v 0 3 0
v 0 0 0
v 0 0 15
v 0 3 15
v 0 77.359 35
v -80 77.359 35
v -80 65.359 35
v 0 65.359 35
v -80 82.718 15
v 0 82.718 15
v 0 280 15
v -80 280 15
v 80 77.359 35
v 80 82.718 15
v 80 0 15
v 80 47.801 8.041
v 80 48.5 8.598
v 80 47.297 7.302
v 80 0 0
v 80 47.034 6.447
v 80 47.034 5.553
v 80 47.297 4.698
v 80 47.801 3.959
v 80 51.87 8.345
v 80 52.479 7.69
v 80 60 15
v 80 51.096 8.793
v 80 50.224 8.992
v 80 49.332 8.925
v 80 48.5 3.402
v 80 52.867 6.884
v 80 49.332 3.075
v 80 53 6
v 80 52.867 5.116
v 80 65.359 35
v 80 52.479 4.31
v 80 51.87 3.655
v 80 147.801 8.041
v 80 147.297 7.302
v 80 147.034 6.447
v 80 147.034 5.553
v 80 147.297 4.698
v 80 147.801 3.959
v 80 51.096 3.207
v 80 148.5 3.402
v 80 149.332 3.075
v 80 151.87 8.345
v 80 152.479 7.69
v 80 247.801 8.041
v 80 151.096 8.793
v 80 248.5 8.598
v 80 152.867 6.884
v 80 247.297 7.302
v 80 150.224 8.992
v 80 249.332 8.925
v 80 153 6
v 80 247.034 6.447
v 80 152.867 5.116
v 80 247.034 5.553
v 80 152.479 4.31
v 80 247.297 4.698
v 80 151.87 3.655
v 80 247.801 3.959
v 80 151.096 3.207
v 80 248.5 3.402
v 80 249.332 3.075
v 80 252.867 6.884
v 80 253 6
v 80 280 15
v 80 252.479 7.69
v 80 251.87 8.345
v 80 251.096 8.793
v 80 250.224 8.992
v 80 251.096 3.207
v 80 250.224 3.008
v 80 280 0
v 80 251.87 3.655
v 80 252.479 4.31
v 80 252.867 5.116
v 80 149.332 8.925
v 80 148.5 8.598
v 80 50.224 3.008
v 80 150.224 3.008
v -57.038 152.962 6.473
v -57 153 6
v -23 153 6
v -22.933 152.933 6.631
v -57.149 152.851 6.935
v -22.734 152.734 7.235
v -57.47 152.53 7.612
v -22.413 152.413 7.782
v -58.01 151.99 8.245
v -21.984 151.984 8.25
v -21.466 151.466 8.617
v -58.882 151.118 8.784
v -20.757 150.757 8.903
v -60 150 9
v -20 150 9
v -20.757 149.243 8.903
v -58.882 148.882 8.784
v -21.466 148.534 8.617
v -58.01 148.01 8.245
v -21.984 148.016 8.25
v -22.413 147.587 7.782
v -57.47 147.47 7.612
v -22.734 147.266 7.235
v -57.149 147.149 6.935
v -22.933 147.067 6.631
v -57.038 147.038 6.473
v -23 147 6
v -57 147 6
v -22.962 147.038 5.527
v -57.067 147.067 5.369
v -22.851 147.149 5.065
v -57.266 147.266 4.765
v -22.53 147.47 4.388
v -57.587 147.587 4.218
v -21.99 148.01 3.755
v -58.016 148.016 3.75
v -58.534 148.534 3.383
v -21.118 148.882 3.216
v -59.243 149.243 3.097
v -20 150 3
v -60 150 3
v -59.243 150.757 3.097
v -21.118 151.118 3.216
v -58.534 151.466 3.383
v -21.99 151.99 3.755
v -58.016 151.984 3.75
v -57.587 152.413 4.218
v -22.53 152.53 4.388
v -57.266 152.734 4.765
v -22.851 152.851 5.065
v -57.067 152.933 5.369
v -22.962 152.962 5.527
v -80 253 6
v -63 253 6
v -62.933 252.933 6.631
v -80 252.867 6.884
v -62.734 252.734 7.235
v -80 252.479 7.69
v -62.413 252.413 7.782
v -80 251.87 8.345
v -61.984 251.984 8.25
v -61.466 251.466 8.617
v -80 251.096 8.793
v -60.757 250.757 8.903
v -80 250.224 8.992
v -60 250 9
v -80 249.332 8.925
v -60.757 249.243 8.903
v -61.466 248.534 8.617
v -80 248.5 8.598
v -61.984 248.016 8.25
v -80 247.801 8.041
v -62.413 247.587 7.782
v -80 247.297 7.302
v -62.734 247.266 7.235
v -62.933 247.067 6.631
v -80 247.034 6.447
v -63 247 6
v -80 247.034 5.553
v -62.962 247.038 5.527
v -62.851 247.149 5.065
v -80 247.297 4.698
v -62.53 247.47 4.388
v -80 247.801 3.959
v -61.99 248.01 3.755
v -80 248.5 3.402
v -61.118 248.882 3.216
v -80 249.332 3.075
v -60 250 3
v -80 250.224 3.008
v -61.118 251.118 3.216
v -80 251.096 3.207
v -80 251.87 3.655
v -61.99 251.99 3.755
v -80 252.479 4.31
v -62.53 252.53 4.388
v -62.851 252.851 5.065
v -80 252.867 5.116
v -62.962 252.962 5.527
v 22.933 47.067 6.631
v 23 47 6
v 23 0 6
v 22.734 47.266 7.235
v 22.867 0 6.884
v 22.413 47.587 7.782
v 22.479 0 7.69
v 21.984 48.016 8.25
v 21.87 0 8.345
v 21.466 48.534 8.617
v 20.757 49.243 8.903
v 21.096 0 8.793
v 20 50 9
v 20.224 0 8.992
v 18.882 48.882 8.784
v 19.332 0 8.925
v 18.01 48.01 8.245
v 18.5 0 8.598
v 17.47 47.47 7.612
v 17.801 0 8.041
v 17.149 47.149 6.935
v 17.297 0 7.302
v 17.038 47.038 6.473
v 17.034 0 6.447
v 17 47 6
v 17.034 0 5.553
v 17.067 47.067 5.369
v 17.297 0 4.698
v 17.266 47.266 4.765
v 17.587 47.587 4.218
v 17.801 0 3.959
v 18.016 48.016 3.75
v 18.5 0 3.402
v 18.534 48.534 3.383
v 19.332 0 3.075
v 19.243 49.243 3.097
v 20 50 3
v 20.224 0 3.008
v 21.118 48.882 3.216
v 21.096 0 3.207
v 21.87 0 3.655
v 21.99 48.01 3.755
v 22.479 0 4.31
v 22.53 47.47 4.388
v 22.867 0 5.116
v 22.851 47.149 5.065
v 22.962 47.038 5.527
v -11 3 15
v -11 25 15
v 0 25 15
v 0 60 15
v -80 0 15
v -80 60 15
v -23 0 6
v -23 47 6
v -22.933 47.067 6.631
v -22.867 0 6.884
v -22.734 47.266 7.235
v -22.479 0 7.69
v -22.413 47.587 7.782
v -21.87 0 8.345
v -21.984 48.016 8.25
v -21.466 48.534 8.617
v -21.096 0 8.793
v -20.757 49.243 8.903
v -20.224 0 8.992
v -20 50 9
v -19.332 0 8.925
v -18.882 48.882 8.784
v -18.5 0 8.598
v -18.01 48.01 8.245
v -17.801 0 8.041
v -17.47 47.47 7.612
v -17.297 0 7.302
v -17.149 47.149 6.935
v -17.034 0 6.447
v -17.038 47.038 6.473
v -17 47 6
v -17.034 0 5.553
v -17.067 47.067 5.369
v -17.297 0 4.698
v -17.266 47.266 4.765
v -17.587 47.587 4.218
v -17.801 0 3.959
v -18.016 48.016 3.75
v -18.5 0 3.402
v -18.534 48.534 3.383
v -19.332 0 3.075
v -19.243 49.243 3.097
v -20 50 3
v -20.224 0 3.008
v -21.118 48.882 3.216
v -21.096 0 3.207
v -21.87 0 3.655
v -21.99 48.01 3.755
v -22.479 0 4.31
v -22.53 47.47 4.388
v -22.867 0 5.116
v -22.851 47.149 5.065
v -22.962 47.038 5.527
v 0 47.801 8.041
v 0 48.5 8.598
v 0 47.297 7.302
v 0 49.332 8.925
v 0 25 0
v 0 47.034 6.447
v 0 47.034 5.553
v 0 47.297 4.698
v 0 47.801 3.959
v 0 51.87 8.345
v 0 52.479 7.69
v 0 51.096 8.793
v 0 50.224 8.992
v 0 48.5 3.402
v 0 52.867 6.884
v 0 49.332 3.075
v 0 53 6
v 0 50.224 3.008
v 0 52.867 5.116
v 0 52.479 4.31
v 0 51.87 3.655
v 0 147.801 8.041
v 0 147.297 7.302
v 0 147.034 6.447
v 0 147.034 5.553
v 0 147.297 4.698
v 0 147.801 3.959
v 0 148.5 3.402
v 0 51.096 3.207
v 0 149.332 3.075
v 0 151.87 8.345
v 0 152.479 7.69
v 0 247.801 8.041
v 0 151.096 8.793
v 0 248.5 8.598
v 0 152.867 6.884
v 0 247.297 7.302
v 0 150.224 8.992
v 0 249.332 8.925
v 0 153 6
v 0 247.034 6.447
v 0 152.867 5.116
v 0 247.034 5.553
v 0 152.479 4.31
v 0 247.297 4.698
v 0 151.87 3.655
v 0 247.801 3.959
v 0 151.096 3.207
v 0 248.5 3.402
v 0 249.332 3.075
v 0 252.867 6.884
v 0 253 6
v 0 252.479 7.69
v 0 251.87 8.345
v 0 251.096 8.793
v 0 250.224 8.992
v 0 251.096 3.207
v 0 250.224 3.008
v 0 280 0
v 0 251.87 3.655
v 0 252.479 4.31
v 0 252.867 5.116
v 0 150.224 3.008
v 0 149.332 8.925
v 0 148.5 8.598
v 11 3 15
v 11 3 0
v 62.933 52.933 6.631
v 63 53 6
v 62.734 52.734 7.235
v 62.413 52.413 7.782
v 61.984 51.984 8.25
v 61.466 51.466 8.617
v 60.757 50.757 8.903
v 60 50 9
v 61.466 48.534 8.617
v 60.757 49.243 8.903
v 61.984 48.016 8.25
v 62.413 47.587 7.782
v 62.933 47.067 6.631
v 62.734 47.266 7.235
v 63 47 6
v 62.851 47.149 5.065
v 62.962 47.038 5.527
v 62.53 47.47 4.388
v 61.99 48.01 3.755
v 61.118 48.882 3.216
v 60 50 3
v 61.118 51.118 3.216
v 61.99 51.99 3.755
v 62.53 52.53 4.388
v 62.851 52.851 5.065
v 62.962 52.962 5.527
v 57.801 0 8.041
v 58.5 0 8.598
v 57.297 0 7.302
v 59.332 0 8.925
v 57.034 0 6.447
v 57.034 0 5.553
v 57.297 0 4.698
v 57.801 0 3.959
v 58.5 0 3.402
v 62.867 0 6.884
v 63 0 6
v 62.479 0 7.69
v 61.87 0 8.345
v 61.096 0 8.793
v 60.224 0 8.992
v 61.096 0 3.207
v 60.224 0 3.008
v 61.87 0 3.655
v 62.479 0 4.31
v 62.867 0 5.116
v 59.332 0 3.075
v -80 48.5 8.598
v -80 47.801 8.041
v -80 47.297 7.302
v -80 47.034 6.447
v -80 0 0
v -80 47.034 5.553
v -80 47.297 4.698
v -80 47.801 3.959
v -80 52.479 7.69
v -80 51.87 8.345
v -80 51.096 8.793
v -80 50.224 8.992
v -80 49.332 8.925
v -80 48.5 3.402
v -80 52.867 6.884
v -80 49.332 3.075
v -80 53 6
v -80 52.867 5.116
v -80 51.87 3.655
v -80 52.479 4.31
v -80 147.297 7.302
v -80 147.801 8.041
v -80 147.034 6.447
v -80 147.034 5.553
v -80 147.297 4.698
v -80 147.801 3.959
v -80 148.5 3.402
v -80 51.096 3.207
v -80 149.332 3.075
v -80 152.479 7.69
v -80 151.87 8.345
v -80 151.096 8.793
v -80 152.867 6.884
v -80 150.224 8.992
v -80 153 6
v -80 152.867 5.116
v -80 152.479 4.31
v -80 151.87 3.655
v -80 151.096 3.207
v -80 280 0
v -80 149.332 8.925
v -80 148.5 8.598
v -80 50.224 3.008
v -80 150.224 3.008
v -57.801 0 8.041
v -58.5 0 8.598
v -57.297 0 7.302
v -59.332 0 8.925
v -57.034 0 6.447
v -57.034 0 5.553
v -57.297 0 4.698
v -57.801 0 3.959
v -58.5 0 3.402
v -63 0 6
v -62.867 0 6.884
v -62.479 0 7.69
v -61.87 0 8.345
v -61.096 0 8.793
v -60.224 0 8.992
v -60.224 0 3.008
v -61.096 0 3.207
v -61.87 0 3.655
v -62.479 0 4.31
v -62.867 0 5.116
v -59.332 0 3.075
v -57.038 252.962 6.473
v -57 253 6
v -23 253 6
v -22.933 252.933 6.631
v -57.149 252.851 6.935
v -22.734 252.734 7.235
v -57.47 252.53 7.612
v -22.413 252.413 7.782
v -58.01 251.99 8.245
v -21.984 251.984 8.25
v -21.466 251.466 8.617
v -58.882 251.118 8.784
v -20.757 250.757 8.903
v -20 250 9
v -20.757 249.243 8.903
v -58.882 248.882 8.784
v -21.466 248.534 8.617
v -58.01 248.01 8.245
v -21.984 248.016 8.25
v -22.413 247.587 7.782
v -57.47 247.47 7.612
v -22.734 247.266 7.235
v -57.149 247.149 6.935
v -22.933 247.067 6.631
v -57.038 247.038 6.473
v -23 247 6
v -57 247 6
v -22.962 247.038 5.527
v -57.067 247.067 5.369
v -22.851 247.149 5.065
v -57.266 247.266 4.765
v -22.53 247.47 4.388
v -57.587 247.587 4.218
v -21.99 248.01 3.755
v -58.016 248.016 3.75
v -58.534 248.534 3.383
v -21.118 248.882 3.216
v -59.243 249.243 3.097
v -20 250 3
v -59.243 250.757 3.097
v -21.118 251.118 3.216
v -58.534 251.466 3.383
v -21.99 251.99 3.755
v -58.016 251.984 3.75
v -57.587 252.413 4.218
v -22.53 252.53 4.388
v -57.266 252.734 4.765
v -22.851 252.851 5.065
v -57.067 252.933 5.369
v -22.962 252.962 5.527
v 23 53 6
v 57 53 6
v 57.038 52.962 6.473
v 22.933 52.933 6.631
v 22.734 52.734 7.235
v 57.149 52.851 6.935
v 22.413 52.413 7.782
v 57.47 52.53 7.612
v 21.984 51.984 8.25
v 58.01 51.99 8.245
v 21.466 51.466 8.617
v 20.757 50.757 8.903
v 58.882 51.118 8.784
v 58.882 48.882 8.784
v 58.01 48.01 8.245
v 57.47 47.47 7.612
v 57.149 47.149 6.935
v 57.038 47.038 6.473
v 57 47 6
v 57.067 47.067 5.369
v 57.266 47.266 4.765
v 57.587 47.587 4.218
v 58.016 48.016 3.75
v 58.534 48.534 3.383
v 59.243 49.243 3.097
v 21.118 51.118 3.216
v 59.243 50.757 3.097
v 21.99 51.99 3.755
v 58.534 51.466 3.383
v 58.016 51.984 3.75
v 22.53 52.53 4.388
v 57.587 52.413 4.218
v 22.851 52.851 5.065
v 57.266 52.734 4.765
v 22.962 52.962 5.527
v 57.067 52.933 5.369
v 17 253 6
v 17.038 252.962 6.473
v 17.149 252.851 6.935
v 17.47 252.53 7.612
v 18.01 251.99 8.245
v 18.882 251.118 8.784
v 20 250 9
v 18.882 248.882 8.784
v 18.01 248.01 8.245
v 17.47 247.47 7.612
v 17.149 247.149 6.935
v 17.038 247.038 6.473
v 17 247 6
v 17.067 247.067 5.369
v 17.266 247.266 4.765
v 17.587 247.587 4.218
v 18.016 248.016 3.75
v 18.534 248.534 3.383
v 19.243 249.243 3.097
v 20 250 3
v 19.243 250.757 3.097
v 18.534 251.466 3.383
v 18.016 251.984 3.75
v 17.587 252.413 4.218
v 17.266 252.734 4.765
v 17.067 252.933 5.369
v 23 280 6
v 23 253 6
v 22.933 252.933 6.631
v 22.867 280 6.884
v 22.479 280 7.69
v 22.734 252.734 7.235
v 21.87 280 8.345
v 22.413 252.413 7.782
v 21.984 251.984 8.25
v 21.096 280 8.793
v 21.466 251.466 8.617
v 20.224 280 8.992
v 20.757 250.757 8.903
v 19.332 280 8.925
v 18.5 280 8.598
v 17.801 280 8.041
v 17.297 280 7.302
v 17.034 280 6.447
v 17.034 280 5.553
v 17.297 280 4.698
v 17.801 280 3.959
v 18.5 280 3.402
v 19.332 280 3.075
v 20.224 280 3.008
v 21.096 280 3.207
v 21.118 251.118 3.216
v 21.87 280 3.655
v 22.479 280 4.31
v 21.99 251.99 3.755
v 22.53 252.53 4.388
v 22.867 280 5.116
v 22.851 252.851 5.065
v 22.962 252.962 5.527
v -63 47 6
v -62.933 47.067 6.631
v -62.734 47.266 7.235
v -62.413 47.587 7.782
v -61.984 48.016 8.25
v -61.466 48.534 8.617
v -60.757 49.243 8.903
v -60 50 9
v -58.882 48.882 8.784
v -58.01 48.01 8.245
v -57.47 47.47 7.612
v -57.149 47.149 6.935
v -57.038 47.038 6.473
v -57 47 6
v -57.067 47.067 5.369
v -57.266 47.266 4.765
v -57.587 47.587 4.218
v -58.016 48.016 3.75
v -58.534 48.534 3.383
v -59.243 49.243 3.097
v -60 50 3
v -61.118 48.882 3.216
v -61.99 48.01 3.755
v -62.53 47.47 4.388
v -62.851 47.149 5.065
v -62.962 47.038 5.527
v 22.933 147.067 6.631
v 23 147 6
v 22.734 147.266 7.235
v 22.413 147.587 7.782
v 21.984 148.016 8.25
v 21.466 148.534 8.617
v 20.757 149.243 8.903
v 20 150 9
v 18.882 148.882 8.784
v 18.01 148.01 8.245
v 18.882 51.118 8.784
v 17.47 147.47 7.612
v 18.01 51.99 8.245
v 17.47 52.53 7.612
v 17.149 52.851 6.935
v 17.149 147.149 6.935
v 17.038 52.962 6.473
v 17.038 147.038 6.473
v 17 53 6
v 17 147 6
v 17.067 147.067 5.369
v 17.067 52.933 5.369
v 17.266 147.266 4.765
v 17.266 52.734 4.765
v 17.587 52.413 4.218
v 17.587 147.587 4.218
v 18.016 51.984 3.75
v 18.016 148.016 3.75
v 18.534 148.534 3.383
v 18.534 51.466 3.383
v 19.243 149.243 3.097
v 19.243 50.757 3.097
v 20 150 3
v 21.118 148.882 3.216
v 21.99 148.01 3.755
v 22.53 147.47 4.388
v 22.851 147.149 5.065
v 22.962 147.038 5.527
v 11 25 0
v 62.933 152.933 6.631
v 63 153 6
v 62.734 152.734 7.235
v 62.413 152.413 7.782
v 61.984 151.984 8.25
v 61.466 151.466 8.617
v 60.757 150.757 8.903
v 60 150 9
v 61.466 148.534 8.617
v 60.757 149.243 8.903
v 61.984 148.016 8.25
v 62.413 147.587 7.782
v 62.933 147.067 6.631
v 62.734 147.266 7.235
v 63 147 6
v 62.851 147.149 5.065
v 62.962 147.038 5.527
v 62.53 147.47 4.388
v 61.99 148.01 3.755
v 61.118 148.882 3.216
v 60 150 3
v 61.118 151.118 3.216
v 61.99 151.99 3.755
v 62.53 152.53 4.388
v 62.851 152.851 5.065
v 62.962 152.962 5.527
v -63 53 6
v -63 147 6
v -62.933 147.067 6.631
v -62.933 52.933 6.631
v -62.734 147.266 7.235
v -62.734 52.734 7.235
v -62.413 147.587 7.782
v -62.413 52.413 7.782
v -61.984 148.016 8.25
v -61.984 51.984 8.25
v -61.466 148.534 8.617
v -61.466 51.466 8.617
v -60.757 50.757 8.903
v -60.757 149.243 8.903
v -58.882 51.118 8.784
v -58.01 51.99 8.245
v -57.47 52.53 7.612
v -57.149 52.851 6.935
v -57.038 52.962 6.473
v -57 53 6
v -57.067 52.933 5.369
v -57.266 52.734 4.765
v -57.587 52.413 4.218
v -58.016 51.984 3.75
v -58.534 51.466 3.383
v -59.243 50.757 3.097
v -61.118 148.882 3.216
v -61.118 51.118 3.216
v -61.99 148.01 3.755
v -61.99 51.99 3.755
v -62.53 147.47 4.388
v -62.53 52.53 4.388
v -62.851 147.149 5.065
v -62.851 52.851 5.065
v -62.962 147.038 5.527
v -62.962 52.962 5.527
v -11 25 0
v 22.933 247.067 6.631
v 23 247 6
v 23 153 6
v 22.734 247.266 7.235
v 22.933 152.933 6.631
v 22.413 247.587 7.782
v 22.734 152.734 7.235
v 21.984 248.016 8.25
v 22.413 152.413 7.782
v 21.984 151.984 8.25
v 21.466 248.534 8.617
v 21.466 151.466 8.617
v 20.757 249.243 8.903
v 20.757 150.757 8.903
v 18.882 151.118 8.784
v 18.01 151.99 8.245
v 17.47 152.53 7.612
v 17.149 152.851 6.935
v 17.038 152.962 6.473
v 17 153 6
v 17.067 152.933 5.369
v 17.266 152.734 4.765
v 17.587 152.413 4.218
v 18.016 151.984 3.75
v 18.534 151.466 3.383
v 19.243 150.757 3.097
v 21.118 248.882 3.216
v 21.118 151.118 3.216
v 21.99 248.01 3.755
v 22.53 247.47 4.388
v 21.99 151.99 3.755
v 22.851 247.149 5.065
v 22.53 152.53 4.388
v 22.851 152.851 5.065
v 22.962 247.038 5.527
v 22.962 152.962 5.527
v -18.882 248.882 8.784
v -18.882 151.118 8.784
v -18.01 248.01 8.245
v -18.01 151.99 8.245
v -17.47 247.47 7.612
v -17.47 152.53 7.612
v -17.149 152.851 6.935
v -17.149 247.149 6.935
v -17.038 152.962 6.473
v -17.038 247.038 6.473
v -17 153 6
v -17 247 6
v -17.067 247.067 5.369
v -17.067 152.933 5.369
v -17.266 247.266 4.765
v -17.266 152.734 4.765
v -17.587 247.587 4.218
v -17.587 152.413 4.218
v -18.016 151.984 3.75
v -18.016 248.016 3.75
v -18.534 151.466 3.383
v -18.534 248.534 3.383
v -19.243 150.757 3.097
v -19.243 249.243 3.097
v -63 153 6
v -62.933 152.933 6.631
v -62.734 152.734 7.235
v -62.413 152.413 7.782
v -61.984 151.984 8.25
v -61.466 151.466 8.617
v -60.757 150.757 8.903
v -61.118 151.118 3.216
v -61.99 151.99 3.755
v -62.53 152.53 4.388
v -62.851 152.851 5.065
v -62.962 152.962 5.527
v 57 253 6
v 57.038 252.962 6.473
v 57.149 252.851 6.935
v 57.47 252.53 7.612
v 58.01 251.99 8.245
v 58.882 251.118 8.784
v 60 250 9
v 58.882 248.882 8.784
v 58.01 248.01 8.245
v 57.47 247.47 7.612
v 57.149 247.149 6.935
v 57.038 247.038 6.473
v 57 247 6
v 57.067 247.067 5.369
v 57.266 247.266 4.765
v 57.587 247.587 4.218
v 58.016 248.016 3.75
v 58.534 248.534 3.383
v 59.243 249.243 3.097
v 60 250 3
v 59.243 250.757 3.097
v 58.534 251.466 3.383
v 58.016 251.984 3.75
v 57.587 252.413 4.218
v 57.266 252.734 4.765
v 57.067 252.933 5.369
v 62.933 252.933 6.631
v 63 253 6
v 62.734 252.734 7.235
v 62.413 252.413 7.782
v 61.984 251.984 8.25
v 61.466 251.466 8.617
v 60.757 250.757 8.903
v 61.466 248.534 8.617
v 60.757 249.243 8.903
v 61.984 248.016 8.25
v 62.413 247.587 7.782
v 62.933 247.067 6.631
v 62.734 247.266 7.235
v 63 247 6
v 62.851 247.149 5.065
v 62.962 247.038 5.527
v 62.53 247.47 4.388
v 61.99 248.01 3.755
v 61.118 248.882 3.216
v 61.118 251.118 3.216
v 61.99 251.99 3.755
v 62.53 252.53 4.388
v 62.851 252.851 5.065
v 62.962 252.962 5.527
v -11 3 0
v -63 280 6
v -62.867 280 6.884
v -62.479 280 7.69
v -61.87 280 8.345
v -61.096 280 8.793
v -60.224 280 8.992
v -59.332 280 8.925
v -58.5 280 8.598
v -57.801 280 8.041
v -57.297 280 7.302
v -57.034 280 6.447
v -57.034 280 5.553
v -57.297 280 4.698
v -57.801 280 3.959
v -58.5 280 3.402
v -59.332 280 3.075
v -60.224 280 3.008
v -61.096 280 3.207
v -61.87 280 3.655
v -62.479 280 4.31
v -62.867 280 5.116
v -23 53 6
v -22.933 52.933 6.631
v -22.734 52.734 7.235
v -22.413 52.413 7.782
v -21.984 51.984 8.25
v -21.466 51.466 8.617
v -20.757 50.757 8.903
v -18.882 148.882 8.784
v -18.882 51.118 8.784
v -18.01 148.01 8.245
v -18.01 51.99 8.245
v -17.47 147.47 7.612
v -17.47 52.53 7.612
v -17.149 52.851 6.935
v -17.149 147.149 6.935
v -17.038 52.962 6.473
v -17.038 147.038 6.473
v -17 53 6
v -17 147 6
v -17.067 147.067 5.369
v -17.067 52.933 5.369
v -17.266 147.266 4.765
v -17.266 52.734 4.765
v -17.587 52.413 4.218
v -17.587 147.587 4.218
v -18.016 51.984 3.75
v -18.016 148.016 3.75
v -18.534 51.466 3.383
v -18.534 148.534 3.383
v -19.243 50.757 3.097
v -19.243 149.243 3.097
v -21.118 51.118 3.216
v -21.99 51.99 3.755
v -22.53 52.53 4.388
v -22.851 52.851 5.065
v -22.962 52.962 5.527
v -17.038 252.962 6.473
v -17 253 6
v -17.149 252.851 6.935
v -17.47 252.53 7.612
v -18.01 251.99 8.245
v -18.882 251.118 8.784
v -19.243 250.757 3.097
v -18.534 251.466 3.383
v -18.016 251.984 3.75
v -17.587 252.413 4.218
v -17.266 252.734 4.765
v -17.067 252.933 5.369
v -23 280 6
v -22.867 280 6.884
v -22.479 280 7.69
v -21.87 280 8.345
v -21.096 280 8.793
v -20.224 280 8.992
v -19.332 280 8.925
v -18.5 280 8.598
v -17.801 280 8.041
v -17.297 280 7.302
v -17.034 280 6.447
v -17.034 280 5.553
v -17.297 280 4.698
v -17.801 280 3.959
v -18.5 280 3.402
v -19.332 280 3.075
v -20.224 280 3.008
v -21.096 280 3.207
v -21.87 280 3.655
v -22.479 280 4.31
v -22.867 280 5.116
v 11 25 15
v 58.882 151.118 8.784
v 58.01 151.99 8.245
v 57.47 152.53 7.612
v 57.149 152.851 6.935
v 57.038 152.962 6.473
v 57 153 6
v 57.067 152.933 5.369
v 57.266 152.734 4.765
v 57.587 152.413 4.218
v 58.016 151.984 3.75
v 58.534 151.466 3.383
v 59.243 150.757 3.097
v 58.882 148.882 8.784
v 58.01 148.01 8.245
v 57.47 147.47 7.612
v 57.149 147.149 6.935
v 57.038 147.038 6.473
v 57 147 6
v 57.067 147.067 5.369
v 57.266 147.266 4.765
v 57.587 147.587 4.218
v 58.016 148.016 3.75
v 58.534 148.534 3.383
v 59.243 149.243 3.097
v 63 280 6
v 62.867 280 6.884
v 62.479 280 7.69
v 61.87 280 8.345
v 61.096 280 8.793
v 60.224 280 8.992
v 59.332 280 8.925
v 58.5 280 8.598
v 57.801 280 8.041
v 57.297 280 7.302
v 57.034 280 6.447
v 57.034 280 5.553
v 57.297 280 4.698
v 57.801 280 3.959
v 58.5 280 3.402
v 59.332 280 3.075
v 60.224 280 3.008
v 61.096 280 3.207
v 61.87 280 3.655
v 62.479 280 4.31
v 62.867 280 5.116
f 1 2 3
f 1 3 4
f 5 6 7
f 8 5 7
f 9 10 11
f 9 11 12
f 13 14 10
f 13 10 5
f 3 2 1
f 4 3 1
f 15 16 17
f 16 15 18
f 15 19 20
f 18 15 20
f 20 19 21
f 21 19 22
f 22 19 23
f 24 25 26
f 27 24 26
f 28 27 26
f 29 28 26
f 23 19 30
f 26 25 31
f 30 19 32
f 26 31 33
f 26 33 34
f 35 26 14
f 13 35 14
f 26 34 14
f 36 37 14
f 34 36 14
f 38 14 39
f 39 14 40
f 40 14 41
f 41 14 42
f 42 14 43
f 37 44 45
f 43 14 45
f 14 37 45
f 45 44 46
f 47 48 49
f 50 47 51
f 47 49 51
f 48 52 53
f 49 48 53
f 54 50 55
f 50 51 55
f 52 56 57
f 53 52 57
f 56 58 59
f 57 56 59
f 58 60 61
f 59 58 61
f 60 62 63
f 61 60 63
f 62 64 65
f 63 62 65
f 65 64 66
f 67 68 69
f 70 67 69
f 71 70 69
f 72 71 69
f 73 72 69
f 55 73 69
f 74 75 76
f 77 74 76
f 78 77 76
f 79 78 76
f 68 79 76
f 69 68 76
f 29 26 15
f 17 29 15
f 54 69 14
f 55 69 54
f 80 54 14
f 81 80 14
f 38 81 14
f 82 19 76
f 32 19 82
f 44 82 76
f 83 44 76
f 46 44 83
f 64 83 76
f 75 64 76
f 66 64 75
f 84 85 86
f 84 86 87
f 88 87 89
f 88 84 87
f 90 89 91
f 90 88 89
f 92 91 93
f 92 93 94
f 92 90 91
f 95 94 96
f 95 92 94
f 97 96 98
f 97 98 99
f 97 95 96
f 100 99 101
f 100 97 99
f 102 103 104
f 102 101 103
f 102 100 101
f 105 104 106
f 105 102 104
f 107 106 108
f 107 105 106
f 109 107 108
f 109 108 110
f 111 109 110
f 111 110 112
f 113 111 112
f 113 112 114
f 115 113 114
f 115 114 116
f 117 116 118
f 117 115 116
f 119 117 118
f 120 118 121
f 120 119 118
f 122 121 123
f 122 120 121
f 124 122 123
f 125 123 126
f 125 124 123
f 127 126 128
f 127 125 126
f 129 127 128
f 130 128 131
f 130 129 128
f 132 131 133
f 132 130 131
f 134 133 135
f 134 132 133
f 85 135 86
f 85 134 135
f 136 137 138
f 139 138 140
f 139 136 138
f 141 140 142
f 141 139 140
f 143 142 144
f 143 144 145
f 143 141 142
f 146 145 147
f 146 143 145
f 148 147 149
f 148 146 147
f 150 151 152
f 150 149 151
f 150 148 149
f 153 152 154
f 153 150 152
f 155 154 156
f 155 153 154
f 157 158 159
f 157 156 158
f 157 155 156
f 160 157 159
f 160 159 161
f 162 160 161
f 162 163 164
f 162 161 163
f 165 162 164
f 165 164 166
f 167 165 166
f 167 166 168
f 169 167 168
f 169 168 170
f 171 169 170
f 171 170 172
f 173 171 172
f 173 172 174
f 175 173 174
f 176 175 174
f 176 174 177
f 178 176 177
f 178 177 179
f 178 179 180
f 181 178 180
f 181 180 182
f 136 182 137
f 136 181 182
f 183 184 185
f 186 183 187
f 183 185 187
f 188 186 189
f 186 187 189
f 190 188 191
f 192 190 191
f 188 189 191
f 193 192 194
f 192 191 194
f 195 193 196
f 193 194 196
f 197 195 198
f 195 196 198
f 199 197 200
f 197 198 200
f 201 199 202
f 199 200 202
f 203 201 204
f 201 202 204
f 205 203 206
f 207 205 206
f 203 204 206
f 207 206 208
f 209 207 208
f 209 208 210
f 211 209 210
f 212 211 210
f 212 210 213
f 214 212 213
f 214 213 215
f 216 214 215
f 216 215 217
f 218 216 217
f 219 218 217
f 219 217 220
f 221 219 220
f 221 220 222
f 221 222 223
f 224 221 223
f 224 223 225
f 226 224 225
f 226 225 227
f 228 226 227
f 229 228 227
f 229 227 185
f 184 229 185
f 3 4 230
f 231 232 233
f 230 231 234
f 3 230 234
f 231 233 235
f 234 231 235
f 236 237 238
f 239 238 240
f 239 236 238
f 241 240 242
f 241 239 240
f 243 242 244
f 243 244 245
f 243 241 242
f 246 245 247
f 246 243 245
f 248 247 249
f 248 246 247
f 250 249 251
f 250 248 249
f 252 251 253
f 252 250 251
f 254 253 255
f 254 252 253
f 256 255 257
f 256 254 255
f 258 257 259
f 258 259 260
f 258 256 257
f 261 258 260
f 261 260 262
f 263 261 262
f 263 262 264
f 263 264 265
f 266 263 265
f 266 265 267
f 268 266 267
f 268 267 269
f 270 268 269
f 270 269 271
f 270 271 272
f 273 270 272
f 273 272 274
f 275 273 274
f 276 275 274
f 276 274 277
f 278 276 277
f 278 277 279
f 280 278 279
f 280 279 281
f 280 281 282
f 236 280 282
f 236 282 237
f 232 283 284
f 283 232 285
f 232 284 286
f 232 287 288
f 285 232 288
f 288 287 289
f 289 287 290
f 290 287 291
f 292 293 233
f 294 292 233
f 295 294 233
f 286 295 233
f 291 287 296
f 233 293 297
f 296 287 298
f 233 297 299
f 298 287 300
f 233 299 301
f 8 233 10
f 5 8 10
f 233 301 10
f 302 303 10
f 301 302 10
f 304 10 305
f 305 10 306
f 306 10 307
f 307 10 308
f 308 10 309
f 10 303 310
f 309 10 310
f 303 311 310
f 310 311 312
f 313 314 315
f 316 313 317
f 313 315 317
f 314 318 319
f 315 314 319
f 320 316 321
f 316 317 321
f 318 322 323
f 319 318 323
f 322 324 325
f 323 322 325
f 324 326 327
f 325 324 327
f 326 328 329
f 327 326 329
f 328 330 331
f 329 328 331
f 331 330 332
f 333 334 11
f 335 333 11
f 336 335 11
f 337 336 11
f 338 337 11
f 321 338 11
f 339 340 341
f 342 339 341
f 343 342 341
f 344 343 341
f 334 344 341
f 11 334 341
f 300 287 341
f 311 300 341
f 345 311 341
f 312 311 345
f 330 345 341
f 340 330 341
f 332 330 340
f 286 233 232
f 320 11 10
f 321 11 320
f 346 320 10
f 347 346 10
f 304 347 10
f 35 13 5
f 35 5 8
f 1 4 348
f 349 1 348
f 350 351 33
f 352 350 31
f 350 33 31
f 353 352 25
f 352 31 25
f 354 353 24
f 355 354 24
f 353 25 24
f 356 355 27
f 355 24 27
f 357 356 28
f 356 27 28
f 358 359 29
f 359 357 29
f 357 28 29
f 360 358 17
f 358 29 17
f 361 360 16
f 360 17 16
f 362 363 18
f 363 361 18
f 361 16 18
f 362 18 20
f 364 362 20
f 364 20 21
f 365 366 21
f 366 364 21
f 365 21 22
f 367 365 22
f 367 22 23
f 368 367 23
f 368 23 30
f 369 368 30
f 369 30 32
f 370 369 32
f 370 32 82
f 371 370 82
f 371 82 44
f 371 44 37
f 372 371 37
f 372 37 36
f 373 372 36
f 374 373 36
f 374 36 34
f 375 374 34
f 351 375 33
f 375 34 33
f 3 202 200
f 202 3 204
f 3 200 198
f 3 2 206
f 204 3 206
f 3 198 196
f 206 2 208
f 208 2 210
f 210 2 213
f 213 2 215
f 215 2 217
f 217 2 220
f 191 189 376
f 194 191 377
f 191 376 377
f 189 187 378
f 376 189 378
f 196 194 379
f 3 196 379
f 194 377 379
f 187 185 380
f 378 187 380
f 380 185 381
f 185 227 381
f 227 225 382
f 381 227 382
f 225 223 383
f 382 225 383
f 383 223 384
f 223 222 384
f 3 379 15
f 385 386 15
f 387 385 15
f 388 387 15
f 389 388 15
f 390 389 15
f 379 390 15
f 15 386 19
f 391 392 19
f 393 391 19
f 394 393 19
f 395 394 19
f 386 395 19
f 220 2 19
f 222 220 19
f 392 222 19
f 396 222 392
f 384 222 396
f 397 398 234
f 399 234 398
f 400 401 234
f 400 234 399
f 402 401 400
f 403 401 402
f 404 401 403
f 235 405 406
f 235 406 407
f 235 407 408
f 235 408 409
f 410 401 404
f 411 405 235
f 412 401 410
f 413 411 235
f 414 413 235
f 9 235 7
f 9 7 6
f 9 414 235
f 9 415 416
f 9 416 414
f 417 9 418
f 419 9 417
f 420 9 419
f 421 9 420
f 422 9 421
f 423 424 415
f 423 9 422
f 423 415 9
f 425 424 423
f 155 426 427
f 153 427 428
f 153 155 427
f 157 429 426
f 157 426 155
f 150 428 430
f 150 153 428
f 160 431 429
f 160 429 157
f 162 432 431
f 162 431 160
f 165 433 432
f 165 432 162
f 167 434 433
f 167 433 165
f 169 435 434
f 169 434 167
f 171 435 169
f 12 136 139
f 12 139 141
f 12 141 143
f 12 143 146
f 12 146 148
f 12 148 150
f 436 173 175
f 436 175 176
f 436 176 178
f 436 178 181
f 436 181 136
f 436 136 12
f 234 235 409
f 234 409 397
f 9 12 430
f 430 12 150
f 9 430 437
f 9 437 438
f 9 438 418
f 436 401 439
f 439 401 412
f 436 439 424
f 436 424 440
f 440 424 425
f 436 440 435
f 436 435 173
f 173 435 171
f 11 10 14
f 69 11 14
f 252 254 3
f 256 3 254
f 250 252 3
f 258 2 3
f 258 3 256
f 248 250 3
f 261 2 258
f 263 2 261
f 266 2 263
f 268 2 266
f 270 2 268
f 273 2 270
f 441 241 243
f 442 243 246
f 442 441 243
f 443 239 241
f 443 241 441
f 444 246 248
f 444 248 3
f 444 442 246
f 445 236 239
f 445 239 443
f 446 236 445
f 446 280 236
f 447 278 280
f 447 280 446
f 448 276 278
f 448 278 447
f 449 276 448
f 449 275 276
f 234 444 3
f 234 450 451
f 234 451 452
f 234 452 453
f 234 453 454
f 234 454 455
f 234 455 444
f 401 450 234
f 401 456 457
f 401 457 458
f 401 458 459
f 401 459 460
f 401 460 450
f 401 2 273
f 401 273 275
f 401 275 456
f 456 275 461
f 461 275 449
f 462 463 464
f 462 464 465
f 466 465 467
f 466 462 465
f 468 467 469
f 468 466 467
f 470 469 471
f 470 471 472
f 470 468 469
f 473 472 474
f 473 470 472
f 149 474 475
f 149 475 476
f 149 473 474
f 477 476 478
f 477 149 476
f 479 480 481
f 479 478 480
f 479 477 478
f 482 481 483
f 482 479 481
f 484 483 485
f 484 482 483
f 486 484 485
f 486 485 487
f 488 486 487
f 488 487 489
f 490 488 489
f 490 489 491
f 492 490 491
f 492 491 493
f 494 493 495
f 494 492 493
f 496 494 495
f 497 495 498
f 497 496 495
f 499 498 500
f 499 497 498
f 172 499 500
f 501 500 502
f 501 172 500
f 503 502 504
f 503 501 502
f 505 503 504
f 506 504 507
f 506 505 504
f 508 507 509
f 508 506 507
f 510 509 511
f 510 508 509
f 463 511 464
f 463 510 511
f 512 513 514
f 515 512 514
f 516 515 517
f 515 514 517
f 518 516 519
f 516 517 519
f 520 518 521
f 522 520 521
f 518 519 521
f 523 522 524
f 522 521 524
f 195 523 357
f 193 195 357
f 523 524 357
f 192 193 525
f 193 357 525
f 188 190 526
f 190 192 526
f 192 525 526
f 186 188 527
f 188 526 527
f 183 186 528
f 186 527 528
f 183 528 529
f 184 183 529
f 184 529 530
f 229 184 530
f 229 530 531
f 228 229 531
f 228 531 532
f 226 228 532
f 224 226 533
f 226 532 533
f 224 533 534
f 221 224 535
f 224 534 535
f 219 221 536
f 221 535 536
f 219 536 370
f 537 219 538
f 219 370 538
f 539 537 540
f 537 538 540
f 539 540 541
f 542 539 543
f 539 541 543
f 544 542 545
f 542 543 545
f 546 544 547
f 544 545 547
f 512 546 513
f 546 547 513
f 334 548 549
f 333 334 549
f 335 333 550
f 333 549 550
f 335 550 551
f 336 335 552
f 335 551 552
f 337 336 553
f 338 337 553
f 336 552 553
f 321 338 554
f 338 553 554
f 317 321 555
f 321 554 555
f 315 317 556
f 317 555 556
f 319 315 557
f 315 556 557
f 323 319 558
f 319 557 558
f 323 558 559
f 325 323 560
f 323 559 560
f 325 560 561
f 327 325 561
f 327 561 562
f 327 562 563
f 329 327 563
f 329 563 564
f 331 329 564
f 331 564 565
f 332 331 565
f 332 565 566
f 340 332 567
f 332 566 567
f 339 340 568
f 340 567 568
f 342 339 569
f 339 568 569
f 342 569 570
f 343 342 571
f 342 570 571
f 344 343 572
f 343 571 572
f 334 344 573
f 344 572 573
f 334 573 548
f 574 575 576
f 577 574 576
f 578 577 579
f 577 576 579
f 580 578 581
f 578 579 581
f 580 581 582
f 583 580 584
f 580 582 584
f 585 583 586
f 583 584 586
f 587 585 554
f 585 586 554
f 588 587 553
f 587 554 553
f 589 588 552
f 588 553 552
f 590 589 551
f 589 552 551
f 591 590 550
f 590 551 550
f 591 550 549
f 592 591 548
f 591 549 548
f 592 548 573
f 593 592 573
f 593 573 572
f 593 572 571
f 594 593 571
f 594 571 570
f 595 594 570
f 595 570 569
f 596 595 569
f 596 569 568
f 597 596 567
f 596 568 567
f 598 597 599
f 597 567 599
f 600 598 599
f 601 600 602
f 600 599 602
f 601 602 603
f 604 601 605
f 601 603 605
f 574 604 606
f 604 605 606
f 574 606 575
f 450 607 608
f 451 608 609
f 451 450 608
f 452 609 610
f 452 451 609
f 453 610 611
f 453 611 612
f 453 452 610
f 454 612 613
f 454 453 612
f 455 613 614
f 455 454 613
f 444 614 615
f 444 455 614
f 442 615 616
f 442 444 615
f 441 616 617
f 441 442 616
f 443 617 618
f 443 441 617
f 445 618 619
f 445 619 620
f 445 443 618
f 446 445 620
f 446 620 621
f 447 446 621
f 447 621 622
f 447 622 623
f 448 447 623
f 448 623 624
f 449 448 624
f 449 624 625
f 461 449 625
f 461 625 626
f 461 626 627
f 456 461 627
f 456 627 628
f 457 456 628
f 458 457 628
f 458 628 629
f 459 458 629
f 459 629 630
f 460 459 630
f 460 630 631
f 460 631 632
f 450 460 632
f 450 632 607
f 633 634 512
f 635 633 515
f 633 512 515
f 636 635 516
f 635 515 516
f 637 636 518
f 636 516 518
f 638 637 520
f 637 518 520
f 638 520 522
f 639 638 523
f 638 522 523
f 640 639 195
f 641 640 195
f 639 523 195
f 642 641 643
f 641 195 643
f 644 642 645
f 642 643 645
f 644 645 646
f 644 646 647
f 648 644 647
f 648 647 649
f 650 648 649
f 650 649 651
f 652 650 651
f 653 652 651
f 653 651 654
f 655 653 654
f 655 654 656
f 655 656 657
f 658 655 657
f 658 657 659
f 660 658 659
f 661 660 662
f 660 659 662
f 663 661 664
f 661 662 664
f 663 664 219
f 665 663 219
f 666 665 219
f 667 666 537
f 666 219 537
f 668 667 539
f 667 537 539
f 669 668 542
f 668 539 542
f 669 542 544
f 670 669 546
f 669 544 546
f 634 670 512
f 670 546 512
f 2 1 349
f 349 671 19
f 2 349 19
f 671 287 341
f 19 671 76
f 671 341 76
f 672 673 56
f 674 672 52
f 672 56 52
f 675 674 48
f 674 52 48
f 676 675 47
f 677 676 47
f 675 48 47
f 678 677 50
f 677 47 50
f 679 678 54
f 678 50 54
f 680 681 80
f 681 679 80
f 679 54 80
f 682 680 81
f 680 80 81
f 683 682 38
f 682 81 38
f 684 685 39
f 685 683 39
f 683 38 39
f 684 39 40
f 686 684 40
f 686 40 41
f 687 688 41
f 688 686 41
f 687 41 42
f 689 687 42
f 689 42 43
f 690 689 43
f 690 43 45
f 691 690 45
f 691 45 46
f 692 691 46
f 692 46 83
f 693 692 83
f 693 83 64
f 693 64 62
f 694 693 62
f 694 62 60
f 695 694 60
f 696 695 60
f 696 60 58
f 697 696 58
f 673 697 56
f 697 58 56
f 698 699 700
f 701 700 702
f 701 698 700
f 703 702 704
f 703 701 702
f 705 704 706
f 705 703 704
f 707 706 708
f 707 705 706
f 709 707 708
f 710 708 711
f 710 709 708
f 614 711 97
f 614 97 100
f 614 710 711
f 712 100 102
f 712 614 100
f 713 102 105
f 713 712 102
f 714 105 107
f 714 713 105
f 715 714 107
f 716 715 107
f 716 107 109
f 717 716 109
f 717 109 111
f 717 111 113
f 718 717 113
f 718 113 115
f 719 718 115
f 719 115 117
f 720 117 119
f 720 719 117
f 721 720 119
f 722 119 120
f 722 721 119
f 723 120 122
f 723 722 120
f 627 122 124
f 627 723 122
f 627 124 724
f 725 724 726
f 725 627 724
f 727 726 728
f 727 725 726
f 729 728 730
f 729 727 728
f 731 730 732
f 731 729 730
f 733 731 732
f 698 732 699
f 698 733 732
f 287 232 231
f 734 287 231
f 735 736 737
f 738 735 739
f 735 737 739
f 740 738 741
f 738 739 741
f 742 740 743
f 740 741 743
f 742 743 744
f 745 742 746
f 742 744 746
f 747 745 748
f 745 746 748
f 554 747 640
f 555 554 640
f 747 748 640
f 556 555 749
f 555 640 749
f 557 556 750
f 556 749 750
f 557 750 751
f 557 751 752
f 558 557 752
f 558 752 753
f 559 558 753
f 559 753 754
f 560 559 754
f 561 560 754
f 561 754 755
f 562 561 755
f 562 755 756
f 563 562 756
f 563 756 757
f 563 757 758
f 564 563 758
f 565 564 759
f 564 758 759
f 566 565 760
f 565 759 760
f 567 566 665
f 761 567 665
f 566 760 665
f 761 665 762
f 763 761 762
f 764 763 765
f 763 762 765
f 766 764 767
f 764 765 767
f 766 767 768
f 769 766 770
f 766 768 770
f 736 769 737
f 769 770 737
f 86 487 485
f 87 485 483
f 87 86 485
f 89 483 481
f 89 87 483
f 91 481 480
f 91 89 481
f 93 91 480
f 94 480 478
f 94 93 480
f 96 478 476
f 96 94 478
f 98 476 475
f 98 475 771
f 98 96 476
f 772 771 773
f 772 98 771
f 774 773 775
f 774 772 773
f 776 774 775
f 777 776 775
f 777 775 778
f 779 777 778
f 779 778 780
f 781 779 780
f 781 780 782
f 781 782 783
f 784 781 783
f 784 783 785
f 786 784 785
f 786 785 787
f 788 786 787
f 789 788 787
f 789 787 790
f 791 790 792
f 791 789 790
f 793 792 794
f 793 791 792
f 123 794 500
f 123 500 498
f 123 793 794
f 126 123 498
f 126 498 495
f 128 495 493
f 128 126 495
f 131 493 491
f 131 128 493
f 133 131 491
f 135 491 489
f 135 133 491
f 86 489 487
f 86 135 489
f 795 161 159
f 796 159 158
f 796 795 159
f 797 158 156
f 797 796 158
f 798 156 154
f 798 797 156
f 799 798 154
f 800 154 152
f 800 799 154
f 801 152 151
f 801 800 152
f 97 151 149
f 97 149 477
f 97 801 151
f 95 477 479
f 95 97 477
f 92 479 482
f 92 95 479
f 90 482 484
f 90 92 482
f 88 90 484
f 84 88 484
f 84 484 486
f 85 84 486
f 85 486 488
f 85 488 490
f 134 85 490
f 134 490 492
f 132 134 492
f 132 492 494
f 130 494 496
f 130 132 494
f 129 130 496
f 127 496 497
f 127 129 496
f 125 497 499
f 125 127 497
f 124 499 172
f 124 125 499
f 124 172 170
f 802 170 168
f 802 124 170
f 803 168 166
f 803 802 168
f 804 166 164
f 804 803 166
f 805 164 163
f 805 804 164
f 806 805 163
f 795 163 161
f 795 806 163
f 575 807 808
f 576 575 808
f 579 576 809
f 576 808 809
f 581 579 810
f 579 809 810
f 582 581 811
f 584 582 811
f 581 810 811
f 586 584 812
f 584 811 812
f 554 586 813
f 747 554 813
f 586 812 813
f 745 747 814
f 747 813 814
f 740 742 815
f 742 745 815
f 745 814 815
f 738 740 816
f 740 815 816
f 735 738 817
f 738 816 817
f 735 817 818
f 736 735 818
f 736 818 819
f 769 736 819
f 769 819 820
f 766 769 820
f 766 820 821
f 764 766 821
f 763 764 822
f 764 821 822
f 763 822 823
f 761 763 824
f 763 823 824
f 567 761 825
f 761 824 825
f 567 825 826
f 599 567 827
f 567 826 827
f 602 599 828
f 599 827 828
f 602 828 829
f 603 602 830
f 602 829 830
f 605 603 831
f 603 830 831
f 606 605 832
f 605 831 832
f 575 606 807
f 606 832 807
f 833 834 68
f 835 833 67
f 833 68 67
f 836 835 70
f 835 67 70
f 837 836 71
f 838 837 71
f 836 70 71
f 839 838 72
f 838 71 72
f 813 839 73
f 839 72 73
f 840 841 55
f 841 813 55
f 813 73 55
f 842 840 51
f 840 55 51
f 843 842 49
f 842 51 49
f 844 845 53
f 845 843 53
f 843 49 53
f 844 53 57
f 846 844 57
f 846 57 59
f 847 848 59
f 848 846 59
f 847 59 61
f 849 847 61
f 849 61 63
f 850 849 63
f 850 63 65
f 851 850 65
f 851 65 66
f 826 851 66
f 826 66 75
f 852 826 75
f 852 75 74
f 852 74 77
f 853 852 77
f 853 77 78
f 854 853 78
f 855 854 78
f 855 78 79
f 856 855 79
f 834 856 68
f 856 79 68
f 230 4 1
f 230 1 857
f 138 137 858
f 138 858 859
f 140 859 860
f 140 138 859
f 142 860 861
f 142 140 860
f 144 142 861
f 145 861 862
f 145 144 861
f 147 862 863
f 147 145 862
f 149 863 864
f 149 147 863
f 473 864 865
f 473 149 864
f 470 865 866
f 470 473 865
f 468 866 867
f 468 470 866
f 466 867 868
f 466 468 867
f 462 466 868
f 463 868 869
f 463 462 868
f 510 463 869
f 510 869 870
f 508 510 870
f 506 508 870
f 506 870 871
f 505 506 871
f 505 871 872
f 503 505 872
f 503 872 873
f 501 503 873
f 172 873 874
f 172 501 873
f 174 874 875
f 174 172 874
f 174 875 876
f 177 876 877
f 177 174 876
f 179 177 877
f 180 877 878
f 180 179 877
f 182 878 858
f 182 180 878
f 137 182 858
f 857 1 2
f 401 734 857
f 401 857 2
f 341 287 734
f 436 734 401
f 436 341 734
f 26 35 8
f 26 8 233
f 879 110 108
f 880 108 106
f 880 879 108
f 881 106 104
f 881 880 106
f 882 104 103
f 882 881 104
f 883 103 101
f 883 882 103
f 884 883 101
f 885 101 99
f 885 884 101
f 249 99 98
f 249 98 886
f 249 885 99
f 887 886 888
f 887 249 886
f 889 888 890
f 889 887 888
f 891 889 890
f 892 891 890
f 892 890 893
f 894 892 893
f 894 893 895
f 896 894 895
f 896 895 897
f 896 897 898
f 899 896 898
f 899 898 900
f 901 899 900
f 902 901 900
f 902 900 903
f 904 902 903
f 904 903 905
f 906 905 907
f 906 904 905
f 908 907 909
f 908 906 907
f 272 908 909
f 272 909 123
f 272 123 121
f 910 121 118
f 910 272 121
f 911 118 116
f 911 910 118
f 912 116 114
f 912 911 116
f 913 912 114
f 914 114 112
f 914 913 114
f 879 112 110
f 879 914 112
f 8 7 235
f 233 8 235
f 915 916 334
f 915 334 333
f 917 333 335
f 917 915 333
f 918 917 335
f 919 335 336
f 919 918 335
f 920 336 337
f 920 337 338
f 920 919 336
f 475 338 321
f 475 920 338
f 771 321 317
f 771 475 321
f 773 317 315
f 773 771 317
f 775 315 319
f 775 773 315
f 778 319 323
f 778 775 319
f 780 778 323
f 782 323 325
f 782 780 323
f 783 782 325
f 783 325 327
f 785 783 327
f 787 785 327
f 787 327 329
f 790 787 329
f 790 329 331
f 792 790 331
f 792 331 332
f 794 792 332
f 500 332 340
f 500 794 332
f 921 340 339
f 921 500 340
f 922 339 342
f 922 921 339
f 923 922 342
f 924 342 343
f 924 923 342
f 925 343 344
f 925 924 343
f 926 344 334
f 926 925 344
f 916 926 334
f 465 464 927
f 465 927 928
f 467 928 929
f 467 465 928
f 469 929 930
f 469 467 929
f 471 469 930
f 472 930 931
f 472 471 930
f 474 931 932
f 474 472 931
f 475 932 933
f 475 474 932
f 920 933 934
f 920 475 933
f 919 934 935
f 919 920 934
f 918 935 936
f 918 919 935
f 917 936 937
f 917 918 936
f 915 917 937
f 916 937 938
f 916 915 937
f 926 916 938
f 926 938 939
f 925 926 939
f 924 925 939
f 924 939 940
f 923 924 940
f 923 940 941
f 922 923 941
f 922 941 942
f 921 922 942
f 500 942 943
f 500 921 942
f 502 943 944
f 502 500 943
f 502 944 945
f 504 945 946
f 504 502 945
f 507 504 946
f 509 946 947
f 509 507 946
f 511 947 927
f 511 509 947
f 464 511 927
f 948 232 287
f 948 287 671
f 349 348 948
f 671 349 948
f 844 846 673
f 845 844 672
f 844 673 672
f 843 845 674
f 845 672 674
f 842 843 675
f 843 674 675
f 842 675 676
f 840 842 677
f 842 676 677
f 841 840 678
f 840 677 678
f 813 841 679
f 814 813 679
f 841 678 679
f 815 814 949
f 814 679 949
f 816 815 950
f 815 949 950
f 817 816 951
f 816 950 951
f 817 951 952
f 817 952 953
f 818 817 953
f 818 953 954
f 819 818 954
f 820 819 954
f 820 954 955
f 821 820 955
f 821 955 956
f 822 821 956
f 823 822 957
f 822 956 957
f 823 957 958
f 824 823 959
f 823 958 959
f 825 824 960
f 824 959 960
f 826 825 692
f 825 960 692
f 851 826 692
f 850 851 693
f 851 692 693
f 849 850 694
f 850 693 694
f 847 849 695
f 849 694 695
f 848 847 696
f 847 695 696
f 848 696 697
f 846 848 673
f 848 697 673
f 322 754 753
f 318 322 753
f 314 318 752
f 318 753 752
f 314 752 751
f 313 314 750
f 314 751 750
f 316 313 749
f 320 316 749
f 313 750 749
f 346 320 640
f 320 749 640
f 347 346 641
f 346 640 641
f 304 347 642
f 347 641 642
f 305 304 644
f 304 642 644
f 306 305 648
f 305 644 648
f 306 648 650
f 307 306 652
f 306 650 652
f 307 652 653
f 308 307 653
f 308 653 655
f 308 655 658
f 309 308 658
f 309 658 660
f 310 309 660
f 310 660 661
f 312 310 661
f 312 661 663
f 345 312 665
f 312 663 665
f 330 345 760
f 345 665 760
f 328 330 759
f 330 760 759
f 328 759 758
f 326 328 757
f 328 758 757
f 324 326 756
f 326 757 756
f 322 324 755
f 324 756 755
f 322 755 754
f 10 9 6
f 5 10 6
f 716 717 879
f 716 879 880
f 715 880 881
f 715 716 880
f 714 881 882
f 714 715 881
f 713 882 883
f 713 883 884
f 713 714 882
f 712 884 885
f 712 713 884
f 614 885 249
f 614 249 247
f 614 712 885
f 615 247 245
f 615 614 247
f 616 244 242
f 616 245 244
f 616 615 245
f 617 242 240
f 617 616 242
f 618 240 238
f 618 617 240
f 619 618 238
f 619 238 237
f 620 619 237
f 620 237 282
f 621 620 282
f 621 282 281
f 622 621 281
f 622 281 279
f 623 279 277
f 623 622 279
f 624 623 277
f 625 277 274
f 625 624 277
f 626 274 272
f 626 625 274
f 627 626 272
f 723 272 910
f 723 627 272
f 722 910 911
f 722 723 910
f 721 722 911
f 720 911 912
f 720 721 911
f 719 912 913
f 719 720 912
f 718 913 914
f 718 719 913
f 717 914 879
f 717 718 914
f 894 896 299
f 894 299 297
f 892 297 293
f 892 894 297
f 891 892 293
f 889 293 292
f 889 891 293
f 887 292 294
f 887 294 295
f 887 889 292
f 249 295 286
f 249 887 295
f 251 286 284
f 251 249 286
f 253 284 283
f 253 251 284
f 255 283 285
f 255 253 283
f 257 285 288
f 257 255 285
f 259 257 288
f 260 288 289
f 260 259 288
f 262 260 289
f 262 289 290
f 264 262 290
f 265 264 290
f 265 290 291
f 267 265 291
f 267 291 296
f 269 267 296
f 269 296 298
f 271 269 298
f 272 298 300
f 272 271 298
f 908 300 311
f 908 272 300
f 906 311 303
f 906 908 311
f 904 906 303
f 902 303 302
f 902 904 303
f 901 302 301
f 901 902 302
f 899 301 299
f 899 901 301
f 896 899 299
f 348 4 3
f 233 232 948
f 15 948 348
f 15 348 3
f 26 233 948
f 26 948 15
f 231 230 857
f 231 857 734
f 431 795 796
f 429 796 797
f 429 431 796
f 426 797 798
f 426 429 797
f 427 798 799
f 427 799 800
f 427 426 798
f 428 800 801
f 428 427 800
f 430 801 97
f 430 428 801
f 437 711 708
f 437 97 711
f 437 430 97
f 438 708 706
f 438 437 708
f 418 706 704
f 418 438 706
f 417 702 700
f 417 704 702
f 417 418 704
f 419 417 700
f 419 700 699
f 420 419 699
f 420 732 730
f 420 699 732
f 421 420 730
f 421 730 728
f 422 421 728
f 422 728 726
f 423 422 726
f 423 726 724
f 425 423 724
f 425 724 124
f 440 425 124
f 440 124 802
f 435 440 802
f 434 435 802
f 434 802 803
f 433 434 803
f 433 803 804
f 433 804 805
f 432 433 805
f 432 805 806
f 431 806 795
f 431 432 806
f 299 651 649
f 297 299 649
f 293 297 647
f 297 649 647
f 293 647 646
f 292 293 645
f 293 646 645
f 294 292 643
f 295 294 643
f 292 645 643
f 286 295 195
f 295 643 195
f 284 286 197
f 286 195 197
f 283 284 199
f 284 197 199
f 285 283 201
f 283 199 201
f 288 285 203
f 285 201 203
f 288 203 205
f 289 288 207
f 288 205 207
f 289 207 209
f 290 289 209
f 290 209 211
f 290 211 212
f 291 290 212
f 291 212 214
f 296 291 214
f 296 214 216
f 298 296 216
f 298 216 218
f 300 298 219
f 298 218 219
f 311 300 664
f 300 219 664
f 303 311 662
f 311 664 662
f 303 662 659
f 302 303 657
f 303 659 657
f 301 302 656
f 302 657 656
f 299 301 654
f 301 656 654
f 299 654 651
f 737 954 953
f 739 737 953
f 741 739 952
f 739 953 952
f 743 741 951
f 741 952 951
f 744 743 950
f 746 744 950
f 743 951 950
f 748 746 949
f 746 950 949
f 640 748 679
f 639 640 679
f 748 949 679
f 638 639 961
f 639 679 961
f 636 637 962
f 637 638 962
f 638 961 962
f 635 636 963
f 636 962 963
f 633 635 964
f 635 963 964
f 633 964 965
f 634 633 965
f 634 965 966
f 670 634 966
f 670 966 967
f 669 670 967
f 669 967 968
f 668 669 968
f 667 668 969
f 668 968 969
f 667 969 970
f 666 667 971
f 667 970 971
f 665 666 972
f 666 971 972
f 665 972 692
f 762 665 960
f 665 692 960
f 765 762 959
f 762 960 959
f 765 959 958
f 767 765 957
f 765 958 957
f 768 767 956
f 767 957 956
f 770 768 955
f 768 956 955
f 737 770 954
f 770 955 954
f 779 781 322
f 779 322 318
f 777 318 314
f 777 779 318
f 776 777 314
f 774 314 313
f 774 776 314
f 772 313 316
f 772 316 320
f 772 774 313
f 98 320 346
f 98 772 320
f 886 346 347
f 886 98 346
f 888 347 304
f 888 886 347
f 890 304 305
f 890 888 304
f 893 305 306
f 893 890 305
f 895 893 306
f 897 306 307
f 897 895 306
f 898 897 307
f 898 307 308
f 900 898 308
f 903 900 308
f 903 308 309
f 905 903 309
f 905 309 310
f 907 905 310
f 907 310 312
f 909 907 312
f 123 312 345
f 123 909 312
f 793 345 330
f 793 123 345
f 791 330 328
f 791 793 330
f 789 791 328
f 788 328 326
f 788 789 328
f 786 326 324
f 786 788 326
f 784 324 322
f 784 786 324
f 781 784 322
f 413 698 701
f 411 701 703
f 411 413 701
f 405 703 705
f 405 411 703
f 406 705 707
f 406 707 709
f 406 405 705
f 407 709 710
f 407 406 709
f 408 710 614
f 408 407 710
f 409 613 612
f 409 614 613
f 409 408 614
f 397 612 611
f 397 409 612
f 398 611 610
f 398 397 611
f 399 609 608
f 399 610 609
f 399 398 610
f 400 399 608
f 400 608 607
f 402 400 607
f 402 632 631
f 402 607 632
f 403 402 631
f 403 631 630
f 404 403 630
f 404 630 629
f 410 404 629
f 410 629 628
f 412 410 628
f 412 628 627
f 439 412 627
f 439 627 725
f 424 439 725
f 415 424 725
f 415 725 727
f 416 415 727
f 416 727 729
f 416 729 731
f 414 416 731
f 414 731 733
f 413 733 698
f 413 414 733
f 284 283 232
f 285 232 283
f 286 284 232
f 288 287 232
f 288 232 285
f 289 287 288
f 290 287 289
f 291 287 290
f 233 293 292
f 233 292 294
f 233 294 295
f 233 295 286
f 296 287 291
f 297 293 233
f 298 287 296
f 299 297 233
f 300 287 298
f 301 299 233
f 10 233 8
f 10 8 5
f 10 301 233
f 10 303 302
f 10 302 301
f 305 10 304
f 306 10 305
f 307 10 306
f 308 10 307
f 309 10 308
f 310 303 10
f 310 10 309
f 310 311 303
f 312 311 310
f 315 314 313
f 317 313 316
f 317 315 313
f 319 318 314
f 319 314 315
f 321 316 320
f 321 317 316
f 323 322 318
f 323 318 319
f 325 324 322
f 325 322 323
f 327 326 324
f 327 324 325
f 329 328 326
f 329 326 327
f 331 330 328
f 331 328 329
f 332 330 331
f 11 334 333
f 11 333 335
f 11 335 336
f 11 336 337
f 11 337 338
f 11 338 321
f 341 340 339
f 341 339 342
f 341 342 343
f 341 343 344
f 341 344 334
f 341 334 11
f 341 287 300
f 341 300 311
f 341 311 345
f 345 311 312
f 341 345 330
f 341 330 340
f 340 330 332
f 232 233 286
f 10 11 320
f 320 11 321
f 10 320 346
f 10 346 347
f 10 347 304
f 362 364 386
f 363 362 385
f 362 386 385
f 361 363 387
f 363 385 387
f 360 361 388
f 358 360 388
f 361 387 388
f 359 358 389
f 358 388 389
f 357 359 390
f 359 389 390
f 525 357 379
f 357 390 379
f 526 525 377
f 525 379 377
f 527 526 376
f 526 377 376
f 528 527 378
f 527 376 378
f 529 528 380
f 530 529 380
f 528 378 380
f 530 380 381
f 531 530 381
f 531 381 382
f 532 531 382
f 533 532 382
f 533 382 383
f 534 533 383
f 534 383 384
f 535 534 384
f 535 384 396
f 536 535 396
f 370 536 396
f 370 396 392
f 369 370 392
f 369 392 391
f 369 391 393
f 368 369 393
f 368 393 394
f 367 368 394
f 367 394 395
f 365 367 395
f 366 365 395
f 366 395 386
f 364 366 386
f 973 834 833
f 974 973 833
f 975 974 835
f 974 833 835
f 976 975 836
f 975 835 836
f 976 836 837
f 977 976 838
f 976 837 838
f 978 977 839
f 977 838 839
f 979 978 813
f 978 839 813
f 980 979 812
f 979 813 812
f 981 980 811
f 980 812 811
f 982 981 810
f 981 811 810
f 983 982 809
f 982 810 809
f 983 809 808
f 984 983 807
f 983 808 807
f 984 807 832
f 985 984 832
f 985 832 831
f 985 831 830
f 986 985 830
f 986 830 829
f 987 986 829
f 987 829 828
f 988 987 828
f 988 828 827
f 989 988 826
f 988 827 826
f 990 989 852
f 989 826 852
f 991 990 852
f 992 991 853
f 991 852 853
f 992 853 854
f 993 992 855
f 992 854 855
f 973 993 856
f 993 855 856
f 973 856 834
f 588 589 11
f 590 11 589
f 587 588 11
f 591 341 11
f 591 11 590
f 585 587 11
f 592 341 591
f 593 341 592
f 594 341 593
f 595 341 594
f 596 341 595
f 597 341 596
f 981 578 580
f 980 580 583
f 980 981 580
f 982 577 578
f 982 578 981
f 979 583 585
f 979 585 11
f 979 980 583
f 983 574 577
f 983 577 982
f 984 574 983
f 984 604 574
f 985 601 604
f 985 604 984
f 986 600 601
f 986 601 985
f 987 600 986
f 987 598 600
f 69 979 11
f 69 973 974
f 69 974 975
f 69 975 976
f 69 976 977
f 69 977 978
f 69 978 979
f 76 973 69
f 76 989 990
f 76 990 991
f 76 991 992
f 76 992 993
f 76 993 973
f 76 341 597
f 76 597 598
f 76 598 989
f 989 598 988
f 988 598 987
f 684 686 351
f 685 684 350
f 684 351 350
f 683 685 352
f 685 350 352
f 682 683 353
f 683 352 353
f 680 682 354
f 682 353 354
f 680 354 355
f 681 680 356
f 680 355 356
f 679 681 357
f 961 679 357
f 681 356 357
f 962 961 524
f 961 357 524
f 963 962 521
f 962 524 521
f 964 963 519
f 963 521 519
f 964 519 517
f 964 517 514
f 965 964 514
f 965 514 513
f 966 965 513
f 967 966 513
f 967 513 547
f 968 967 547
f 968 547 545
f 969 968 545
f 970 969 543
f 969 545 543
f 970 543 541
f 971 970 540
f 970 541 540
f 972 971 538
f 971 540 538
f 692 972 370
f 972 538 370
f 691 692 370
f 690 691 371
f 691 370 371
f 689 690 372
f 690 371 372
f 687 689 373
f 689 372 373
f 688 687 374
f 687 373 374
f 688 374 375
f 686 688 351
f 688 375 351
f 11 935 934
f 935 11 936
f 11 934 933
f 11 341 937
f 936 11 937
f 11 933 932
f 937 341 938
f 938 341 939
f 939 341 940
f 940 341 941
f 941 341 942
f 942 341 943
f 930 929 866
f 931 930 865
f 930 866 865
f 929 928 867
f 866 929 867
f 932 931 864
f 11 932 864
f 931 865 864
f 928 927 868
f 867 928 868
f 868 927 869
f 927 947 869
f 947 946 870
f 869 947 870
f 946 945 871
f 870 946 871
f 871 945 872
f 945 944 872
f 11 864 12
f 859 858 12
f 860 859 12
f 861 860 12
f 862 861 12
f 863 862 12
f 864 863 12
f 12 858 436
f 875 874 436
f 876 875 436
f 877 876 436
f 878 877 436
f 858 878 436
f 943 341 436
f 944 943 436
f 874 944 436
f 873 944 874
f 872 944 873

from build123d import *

# Parameters (mm, degrees)
F0_W      = 80
F0_H      = 280
F1_DEPTH  = 15
F3_DEPTH  = 80
F4_W      = 11
F4_H      = 22
F5_DEPTH  = 15
F7_R      = 3
F7_R_2    = 6.556779
F8_DEPTH  = 280.001
F9_R      = 3
F10_DEPTH = 80.001


with BuildPart() as f1:
    # F0 (on Top) → F1 (new body)
    with BuildSketch(Plane.XY):
        with Locations((40, 140)):
            Rectangle(F0_W, F0_H)
    extrude(amount=F1_DEPTH)

    # F2 (on face) → F3 (join)
    with BuildSketch(Plane.YZ.offset(80)):
        Polygon((65.358984, 35), (60, 15), (82.717968, 15), (77.358984, 35), align=None)
    extrude(amount=-F3_DEPTH)

    # F4 (on face) → F5 (cut, through all)
    with BuildSketch(Plane.XY.offset(15)):
        with Locations((5.5, 14)):
            Rectangle(F4_W, F4_H)
    extrude(amount=-F5_DEPTH, mode=Mode.SUBTRACT)

    # F7 (on face) → F8 (cut, through all)
    with BuildSketch(Plane.XZ):
        with Locations((60, 6)):
            Circle(F7_R)
        with Locations((-491.183044, 5.330358)):
            Circle(F7_R_2)
        with Locations((20, 6)):
            Circle(F7_R)
    extrude(amount=-F8_DEPTH, mode=Mode.SUBTRACT)

    # F9 (on face) → F10 (cut, through all)
    with BuildSketch(Plane.YZ.offset(80)):
        with Locations((50, 6)):
            Circle(F9_R)
        with Locations((150, 6)):
            Circle(F9_R)
        with Locations((250, 6)):
            Circle(F9_R)
    extrude(amount=-F10_DEPTH, mode=Mode.SUBTRACT)


with BuildPart() as f11_1:
    # F11: instance of F1
    add(f1.part.mirror(Plane(origin=(0, 145.659771, 8.93017), x_dir=(0, -1, 0), z_dir=(-1, 0, 0))))


solid = Compound([f1.part, f11_1.part])
